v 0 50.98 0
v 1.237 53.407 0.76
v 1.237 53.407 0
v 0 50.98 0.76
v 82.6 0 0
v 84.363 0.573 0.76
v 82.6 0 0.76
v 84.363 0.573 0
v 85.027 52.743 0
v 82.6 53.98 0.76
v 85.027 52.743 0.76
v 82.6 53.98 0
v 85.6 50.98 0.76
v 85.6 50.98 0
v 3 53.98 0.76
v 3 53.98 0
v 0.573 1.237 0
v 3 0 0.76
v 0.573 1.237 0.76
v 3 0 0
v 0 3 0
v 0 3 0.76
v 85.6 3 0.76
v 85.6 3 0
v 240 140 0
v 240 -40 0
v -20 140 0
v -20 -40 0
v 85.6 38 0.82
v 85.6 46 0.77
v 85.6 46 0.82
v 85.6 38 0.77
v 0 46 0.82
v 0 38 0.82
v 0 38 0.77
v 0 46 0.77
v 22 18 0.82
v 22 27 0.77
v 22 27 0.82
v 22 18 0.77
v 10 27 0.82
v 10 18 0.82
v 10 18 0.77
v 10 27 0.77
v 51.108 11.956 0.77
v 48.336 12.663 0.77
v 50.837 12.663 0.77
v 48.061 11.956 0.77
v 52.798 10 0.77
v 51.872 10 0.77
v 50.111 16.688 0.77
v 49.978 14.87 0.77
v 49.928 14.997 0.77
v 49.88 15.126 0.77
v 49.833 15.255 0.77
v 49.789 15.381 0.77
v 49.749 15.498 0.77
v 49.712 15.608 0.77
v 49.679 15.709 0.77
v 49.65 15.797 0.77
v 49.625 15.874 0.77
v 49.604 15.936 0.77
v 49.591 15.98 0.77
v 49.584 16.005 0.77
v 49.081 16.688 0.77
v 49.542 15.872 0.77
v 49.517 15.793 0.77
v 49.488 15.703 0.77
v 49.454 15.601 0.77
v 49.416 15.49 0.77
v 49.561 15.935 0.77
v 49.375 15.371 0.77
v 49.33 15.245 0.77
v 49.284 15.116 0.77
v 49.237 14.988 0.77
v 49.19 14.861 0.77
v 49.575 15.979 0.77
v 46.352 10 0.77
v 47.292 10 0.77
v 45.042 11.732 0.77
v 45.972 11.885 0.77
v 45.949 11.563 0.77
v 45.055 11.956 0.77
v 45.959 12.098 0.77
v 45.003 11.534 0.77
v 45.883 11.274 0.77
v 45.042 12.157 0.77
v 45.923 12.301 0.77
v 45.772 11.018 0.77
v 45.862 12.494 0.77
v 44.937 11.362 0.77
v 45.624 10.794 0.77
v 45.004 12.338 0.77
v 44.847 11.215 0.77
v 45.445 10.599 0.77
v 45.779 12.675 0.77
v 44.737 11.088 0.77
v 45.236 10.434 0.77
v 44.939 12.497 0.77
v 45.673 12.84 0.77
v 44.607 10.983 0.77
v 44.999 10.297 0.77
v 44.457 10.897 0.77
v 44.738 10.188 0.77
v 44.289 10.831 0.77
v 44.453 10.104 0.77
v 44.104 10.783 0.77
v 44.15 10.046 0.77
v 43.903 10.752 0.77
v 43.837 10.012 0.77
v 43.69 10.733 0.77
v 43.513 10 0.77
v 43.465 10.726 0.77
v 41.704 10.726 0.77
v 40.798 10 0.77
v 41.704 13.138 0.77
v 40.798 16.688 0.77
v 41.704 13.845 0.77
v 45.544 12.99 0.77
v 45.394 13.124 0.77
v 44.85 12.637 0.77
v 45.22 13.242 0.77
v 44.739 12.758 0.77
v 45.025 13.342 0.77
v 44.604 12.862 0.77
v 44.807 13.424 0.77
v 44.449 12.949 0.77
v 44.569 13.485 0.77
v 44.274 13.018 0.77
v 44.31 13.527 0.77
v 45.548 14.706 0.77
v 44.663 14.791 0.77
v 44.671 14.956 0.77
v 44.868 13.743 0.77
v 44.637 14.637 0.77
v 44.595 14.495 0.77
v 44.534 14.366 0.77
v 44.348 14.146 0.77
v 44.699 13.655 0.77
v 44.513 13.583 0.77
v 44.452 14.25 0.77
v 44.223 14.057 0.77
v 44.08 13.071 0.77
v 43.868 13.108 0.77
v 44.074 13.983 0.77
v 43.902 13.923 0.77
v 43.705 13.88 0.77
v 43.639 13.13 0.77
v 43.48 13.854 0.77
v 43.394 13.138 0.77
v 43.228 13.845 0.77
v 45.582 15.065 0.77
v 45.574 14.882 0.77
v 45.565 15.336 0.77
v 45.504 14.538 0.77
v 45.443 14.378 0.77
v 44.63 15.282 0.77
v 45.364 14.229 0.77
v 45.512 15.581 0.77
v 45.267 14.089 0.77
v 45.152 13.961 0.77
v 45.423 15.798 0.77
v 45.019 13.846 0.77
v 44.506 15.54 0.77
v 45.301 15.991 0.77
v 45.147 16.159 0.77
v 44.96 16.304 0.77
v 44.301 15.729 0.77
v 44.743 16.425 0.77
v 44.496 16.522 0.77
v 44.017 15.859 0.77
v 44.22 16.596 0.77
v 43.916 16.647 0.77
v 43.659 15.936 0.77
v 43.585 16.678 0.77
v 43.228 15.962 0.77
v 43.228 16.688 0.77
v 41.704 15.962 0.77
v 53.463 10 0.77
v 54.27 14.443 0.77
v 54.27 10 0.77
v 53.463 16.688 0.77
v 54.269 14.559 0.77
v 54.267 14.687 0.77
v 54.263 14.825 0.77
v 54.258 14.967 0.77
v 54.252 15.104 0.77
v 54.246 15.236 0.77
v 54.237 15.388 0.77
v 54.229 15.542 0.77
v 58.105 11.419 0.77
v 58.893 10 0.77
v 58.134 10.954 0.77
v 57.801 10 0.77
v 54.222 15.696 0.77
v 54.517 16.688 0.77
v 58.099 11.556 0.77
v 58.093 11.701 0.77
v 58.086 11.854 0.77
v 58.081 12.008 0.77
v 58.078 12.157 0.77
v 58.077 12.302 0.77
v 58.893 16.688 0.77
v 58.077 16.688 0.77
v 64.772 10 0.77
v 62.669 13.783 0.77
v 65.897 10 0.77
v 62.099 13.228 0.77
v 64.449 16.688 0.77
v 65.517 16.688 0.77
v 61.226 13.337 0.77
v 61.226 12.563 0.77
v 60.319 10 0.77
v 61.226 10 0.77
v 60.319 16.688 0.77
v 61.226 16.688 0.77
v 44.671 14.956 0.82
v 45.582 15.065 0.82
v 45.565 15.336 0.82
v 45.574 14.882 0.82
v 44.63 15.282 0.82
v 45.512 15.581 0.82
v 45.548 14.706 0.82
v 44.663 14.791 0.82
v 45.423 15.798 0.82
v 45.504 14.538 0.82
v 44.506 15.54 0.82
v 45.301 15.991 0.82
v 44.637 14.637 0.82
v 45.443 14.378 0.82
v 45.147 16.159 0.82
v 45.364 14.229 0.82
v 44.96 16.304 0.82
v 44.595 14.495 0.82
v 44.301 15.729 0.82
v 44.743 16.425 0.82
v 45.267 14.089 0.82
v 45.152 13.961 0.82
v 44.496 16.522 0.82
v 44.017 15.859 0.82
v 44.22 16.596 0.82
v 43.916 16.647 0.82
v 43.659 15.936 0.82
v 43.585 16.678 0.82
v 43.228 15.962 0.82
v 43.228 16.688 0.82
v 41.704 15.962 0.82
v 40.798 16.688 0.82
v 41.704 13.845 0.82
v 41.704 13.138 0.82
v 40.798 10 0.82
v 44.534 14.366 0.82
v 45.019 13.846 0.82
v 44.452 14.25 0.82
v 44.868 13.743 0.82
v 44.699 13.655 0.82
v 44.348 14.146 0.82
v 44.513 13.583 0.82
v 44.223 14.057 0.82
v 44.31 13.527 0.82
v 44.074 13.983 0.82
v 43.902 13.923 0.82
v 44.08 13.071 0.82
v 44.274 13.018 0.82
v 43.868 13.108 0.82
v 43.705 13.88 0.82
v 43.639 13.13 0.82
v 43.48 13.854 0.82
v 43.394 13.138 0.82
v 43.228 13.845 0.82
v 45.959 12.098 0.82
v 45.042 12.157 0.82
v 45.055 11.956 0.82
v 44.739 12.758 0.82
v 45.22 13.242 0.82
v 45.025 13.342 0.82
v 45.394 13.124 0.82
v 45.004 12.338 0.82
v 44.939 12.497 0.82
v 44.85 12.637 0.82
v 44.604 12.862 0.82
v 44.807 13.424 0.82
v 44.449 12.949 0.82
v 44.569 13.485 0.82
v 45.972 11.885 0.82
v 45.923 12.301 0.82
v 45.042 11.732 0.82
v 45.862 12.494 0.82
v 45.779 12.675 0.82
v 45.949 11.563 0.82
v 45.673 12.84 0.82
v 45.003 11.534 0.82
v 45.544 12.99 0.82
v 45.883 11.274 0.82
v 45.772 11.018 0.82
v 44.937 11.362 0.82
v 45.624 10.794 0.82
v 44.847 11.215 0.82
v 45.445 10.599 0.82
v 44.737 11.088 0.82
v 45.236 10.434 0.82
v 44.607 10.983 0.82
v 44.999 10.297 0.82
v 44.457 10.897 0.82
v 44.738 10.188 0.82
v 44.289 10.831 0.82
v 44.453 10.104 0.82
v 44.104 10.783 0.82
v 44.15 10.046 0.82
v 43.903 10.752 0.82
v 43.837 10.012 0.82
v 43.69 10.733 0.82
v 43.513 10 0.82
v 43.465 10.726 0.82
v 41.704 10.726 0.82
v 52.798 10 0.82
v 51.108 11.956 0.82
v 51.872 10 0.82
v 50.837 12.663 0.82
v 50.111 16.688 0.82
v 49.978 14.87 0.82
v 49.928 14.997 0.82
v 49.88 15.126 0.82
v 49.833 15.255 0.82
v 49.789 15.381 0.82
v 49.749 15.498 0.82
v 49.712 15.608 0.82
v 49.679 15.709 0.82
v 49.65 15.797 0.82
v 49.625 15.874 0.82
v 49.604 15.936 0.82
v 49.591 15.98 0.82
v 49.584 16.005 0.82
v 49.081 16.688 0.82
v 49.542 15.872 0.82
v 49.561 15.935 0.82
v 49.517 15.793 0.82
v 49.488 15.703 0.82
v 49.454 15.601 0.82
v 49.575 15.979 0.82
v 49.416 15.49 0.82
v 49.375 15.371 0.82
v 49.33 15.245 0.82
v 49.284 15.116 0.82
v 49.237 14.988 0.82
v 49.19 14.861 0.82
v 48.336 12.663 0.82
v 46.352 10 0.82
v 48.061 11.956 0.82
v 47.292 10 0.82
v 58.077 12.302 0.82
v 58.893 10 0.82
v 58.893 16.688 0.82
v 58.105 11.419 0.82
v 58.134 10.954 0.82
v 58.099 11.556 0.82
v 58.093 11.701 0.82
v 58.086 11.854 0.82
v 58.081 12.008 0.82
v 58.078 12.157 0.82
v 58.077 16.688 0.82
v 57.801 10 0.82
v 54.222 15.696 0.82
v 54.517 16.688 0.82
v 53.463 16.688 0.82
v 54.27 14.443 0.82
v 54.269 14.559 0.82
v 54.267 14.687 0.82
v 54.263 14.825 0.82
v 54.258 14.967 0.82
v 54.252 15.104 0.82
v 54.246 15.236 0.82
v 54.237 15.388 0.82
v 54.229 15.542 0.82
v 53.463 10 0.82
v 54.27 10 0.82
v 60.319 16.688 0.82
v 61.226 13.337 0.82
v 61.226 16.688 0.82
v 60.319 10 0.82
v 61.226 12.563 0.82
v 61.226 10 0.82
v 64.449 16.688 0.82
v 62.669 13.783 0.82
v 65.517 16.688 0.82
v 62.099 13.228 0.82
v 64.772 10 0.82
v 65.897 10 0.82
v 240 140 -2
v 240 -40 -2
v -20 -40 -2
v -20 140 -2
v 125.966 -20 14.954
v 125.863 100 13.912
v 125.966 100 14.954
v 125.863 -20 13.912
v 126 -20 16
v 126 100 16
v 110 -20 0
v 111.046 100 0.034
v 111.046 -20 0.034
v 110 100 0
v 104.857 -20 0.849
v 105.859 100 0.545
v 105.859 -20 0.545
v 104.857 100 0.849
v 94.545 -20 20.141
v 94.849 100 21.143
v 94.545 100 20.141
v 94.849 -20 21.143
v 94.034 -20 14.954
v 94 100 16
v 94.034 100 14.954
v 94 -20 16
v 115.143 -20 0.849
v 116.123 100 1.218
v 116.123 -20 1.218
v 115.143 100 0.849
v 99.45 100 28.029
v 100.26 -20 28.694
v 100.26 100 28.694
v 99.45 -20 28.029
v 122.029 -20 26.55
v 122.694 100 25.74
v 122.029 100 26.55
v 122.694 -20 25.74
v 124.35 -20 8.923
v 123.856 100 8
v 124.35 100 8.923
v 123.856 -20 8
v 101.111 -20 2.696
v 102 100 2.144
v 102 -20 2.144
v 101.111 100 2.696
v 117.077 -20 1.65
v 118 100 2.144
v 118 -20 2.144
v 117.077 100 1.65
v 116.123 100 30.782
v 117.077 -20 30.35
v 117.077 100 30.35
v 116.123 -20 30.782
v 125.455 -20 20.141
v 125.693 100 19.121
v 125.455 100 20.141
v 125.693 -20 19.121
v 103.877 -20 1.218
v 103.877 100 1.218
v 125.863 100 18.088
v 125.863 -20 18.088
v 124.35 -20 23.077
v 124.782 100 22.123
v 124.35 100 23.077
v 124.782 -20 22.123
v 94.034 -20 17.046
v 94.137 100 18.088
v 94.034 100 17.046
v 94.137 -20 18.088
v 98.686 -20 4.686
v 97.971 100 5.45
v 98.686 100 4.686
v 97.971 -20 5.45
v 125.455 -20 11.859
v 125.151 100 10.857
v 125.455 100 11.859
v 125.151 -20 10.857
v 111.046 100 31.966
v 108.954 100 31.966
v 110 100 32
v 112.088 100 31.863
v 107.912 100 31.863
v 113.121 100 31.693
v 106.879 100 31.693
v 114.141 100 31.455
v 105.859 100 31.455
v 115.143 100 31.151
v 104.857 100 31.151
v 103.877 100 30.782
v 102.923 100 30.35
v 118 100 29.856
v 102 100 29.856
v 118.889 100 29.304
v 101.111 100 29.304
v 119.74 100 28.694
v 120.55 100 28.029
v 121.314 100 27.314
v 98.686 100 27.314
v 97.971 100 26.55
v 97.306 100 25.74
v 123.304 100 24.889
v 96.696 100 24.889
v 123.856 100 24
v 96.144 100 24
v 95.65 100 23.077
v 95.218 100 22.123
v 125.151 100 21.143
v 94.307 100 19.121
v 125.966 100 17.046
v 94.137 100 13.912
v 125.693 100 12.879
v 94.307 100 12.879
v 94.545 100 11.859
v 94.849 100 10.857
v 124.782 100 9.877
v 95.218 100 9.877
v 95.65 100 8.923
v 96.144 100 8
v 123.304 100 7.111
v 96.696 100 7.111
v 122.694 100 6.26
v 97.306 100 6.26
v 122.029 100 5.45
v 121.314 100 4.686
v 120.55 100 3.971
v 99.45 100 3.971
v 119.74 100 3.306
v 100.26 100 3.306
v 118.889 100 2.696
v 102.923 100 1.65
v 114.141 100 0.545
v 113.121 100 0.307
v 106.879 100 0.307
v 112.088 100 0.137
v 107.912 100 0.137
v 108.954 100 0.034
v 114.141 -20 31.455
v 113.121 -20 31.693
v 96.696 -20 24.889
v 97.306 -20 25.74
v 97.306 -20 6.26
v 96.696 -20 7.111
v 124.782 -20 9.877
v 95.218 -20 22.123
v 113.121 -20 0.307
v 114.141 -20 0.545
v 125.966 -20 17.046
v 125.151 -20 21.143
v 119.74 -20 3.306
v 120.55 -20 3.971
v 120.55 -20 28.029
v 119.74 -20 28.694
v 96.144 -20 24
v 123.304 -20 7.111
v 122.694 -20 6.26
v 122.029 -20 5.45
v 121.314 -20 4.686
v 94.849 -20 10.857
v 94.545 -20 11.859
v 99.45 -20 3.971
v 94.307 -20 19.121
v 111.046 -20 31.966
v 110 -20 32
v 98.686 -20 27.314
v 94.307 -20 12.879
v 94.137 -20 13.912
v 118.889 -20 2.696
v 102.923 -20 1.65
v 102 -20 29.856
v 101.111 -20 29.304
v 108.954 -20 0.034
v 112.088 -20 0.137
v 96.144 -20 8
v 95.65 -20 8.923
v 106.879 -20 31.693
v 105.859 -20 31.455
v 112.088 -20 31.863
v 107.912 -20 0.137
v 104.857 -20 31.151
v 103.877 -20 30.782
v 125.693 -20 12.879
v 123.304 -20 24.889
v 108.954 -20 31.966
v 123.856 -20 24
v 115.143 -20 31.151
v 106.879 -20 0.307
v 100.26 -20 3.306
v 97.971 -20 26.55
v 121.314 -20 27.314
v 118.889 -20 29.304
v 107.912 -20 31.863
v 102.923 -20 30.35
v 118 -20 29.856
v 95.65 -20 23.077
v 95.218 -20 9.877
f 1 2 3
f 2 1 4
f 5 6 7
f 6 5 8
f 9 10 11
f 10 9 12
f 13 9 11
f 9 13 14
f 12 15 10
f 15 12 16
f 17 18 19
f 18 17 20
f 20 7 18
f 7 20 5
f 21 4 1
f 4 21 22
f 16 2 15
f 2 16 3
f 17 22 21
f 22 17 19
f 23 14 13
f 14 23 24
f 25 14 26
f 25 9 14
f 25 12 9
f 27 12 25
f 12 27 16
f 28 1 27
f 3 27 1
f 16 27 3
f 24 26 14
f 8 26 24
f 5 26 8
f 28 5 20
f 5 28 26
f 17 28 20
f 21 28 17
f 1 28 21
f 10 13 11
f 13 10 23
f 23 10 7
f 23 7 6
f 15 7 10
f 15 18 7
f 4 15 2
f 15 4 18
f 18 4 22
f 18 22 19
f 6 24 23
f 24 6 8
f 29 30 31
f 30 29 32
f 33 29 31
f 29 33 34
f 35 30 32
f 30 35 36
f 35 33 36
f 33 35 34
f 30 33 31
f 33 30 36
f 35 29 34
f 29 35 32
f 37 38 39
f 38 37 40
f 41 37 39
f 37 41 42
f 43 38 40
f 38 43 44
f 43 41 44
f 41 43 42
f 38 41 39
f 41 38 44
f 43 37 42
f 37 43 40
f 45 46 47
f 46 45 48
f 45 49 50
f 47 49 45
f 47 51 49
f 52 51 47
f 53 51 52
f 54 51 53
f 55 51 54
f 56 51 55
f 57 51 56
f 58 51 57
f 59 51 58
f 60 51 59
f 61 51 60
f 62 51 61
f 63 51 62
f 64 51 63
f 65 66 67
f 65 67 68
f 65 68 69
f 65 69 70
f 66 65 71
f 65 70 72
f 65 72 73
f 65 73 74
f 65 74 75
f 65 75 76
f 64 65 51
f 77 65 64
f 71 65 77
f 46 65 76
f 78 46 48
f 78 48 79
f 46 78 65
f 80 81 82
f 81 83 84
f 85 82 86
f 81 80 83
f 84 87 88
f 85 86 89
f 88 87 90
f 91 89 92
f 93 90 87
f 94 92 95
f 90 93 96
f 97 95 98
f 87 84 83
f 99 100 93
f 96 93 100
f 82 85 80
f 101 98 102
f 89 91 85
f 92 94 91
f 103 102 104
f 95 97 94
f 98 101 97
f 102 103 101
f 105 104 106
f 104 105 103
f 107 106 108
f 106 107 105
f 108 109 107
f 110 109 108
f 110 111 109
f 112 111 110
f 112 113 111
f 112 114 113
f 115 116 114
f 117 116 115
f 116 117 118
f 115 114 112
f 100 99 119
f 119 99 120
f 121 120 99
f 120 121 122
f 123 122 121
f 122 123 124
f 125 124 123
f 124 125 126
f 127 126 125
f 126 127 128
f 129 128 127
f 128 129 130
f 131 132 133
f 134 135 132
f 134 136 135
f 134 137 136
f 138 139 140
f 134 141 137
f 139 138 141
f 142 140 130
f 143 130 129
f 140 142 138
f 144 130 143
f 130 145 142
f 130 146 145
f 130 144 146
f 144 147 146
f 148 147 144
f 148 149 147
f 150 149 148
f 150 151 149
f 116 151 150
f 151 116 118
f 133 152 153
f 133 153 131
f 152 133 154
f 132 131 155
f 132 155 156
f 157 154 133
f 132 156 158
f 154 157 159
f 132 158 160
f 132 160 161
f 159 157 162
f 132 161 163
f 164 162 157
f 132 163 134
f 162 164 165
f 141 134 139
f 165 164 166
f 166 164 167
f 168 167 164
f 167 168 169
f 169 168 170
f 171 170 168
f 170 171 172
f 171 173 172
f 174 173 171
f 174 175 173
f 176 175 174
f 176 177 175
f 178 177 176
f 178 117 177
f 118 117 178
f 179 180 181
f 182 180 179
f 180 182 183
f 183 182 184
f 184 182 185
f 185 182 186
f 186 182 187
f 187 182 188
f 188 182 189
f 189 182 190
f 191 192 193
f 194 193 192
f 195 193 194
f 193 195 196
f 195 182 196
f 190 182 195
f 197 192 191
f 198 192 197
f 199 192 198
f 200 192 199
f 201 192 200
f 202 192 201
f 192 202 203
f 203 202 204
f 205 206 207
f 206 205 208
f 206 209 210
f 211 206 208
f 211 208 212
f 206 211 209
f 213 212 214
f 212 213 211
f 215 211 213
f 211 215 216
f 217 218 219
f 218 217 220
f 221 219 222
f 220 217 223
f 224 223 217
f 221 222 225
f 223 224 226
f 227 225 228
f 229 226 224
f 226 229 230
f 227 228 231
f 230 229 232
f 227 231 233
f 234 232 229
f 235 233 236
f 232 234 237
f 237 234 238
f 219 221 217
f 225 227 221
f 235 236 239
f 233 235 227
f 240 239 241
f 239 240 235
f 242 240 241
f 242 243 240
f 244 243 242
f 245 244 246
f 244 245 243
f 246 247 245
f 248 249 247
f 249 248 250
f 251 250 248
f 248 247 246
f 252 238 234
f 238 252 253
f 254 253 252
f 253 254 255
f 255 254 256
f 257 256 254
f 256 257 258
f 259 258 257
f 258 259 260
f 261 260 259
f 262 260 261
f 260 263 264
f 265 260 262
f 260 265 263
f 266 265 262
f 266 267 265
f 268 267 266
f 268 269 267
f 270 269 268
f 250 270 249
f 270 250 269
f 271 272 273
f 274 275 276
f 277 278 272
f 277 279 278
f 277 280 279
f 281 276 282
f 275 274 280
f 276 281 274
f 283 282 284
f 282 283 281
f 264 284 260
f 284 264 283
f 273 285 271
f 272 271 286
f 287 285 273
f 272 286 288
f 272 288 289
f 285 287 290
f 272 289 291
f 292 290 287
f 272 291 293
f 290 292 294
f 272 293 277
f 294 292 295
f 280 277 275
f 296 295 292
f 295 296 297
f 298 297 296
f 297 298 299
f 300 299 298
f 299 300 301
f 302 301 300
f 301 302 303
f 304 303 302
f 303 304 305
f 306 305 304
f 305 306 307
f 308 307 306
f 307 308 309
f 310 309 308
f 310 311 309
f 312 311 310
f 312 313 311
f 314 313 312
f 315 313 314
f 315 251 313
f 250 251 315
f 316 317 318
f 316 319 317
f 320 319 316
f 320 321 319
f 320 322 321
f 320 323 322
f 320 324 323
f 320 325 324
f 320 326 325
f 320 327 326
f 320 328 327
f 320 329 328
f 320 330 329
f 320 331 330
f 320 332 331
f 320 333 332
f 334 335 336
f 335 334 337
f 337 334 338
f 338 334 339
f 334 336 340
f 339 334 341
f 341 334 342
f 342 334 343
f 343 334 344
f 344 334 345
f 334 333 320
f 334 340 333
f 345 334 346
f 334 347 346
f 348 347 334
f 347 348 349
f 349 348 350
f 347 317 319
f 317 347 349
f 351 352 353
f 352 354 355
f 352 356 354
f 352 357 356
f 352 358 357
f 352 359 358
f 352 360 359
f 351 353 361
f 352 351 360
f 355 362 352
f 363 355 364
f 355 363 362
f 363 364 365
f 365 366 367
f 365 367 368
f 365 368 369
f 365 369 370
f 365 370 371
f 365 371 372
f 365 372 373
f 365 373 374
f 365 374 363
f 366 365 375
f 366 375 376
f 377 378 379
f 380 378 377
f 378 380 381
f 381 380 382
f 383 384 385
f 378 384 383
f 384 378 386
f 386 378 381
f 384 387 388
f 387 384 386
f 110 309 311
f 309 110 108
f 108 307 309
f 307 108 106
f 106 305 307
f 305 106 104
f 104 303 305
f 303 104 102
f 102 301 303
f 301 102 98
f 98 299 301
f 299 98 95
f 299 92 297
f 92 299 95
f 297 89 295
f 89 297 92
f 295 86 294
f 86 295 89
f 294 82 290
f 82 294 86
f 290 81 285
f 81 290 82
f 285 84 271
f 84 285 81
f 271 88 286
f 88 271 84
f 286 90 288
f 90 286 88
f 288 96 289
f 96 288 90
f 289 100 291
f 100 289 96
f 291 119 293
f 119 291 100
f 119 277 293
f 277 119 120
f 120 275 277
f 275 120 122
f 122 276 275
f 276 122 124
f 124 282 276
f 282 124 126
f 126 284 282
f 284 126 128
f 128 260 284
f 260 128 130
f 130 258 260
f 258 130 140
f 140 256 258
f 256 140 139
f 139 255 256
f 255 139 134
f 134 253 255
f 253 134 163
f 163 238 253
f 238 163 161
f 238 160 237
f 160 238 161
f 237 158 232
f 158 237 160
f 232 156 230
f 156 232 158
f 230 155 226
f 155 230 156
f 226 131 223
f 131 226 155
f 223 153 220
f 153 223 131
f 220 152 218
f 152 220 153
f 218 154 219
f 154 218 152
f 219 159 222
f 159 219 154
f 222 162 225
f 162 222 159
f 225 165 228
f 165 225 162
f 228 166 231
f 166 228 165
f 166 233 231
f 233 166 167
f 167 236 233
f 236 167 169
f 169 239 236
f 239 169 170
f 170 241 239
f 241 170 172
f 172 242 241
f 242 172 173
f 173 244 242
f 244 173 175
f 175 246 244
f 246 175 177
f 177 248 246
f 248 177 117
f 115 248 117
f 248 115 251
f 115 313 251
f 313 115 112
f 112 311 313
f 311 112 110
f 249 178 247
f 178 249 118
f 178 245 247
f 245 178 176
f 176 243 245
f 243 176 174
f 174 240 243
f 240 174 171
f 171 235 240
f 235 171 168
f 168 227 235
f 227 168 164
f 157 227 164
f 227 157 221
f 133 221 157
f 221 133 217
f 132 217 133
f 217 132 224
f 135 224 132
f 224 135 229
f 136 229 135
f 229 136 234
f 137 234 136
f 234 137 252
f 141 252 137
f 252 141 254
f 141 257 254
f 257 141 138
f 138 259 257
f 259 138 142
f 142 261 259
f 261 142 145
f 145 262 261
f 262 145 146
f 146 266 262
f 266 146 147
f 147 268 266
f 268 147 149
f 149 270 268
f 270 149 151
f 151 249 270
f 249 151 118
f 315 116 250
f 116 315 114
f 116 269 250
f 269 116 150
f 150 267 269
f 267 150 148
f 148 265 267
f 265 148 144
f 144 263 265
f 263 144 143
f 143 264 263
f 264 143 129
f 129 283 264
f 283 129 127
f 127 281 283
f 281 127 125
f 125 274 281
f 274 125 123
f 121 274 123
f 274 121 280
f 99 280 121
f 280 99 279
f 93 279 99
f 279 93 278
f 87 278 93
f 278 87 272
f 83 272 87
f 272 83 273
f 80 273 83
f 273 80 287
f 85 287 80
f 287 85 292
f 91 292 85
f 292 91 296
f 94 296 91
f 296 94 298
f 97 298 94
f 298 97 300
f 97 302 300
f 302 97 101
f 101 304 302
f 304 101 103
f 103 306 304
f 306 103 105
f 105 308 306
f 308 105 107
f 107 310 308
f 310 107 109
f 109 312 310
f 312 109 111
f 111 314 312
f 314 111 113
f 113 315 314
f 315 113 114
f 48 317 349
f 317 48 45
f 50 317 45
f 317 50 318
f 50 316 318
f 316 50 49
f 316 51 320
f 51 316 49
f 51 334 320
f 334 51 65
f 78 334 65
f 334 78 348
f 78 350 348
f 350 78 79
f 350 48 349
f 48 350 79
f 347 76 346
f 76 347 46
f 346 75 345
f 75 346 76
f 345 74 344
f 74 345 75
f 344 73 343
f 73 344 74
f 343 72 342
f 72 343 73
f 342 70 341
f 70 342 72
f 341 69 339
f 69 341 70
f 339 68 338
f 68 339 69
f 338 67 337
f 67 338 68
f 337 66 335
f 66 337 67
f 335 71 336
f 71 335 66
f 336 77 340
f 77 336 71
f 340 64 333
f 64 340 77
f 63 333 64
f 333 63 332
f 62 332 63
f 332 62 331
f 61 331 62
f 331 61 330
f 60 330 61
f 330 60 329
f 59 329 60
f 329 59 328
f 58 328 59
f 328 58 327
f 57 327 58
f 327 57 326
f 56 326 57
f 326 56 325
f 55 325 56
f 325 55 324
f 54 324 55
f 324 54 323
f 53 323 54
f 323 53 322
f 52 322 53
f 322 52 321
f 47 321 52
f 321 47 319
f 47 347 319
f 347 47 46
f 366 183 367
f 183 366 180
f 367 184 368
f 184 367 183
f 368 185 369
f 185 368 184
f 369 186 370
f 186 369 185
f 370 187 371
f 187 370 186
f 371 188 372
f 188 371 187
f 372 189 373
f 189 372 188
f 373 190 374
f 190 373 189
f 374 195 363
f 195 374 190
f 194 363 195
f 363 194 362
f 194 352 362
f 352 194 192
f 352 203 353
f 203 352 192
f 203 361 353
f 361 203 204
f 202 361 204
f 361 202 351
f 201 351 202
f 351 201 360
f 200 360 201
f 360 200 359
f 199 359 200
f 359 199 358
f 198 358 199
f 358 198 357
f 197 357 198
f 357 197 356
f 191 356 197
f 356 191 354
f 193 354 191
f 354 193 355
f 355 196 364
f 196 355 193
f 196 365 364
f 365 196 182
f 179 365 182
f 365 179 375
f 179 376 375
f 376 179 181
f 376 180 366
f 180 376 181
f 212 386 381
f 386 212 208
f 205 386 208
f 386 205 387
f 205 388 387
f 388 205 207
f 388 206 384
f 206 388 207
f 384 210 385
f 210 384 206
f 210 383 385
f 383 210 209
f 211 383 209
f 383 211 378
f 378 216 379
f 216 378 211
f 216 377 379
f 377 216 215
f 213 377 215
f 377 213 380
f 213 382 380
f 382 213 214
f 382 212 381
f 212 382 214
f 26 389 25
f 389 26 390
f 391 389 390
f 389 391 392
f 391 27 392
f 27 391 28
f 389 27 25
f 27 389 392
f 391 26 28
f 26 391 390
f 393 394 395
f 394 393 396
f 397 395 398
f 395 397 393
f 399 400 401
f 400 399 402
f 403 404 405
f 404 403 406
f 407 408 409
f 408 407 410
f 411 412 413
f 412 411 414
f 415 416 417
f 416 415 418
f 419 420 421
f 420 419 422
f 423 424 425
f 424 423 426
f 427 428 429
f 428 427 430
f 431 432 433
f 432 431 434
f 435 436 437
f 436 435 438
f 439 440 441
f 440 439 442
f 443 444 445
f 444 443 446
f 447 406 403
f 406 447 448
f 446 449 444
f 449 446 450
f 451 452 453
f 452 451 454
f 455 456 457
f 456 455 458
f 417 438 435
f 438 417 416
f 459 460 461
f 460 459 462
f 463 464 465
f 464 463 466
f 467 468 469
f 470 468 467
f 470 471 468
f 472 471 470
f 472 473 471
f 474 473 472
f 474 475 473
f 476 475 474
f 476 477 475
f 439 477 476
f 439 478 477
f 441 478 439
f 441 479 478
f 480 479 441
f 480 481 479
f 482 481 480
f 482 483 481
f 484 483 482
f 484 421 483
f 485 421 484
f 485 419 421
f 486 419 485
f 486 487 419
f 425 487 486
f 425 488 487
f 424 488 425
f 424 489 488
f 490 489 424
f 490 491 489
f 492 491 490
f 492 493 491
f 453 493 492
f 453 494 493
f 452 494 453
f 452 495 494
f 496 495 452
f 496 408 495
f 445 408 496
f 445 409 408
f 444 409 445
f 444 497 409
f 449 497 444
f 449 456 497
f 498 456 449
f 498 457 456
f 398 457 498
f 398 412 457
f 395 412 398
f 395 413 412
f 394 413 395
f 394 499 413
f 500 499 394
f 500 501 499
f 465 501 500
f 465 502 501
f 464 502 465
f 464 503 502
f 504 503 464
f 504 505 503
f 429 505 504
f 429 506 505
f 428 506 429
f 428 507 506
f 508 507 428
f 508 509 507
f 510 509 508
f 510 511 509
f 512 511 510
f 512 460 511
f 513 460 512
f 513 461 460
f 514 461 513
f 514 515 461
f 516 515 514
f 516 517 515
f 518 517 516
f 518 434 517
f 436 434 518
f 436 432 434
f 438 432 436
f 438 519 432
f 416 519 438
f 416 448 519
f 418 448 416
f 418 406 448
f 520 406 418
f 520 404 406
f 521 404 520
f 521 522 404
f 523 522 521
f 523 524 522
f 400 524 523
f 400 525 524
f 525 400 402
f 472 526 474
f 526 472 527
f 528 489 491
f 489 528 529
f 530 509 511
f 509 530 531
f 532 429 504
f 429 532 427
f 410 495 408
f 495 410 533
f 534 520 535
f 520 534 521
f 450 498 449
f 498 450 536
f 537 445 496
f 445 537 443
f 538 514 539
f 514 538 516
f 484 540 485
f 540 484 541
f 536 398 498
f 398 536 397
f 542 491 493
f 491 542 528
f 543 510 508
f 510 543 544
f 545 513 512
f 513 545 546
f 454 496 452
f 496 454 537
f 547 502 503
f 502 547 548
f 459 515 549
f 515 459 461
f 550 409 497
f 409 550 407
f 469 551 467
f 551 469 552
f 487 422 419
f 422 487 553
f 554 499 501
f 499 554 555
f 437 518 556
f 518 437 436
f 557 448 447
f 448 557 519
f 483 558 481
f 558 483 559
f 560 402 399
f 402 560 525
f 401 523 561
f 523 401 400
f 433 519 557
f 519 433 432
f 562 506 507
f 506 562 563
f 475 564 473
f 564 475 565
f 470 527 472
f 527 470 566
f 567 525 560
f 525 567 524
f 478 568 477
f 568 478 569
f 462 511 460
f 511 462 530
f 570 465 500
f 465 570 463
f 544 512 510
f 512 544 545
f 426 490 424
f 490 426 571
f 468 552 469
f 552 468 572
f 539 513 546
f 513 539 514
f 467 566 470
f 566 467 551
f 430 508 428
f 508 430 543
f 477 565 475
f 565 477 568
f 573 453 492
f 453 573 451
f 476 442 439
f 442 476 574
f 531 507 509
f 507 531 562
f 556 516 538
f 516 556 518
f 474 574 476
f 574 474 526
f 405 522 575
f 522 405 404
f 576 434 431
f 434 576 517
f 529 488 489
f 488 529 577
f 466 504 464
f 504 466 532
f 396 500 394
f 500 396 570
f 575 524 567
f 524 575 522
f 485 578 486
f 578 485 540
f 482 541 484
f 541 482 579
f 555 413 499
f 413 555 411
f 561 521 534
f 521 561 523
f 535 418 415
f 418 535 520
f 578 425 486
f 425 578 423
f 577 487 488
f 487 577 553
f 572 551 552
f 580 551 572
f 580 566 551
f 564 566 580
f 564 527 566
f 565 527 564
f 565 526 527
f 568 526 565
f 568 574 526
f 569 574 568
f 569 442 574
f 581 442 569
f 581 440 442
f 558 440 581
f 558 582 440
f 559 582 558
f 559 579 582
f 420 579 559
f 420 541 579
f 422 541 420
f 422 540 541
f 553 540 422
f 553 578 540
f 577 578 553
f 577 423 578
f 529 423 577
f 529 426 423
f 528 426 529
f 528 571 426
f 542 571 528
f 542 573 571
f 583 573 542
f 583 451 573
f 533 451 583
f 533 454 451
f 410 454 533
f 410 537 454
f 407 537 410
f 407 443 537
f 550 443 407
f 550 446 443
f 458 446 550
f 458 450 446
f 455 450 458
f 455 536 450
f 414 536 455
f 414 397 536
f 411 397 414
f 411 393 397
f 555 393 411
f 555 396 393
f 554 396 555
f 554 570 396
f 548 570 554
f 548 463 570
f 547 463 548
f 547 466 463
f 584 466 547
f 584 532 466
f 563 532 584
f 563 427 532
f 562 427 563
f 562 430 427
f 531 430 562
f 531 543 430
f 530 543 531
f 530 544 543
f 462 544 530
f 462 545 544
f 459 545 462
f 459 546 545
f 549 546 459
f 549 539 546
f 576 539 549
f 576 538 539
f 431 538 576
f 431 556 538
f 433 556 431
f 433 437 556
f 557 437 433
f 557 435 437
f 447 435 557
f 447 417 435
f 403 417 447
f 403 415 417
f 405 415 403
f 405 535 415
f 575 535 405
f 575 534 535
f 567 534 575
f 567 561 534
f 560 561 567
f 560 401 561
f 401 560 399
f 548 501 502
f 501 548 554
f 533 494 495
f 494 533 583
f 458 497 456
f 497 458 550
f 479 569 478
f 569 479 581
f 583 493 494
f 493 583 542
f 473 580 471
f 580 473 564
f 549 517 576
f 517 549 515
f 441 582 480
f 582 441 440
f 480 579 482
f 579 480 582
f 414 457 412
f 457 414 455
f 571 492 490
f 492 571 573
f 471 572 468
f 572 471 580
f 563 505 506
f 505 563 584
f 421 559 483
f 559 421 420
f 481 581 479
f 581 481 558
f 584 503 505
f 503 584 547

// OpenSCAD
// file: card.scad
// Shared props for eval photos: an ISO ID-1 card (85.6 x 53.98 mm) and a wooden table top.
module card() {
  color("#1f4fa8") linear_extrude(0.76) offset(r = 3) offset(delta = -3) square([85.6, 53.98]);
  color("#111") translate([0, 38, 0.77]) cube([85.6, 8, 0.05]);
  color("#e8c547") translate([10, 18, 0.77]) cube([12, 9, 0.05]);
  color("white") translate([40, 10, 0.77]) linear_extrude(0.05) text("BANK", size = 7);
}
module table(w = 260, d = 180) { color("#c9a27a") translate([-20, -40, -2]) cube([w, d, 2]); }
// main file
// A 32 mm pipe lying next to a credit card, seen from above. Truth: pipe diameter 32 mm.
include <card.scad>
table();
card();
color("#9aa3ab") translate([110, -20, 16]) rotate([-90, 0, 0]) cylinder(d = 32, h = 120, $fn = 96);
color("#7d868e") translate([110, -20, 16]) rotate([-90, 0, 0]) cylinder(d = 26, h = 0.6, $fn = 96);
